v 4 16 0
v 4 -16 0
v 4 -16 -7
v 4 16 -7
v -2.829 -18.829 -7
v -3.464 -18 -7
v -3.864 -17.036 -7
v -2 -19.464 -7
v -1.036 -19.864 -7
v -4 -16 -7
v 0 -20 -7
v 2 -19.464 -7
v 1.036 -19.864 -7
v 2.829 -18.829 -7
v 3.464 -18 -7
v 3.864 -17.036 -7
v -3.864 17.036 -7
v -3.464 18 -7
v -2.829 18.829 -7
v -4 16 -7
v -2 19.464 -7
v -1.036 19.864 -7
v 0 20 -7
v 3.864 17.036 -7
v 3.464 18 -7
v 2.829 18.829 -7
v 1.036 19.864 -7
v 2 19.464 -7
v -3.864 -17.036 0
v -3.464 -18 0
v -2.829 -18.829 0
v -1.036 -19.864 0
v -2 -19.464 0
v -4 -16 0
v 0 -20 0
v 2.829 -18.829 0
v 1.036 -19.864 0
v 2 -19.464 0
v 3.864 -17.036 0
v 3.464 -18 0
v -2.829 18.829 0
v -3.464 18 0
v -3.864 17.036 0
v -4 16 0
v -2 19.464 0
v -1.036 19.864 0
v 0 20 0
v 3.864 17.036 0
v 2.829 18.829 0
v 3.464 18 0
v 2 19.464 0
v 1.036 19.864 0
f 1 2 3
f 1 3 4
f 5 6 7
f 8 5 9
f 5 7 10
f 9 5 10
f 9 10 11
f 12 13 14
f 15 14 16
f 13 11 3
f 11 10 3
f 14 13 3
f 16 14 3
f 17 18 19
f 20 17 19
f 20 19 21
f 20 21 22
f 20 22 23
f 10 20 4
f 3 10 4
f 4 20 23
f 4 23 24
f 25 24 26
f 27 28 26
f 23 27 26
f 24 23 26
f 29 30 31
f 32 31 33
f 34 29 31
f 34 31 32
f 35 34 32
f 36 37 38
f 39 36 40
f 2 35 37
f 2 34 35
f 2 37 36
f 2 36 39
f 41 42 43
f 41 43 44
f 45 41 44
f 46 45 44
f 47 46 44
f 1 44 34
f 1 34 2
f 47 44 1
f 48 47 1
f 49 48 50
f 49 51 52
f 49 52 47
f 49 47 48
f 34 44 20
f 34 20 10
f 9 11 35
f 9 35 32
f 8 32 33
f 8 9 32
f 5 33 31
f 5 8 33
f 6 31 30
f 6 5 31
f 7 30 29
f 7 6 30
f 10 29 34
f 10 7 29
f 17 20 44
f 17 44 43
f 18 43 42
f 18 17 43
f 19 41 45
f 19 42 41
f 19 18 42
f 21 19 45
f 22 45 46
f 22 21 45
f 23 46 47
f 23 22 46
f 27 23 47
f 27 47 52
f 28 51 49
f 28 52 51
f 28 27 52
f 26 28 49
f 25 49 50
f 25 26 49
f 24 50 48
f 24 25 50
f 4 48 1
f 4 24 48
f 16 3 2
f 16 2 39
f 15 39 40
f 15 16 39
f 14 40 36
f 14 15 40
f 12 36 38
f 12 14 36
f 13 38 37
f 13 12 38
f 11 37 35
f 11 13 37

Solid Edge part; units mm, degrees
sketch "Sketch1" plane through (0, 0, 0) normal (0, 0, 1) x (1, 0, 0)
  line L0 (-4, -20) -> (4, -20)
  line L1 (4, -20) -> (4, 20)
  line L2 (4, 20) -> (-4, 20)
  line L3 (-4, 20) -> (-4, -20)
  dimension "D1" = 8
  dimension "D2" = 40
extrude "Protrusion1" add sketch "Sketch1" against normal blind 7
fillet "Round_4" radius 4 4 edges at (4, -20, -3.5) (-4, -20, -3.5) (4, 20, -3.5) (-4, 20, -3.5)
properties material "Stainless steel"
